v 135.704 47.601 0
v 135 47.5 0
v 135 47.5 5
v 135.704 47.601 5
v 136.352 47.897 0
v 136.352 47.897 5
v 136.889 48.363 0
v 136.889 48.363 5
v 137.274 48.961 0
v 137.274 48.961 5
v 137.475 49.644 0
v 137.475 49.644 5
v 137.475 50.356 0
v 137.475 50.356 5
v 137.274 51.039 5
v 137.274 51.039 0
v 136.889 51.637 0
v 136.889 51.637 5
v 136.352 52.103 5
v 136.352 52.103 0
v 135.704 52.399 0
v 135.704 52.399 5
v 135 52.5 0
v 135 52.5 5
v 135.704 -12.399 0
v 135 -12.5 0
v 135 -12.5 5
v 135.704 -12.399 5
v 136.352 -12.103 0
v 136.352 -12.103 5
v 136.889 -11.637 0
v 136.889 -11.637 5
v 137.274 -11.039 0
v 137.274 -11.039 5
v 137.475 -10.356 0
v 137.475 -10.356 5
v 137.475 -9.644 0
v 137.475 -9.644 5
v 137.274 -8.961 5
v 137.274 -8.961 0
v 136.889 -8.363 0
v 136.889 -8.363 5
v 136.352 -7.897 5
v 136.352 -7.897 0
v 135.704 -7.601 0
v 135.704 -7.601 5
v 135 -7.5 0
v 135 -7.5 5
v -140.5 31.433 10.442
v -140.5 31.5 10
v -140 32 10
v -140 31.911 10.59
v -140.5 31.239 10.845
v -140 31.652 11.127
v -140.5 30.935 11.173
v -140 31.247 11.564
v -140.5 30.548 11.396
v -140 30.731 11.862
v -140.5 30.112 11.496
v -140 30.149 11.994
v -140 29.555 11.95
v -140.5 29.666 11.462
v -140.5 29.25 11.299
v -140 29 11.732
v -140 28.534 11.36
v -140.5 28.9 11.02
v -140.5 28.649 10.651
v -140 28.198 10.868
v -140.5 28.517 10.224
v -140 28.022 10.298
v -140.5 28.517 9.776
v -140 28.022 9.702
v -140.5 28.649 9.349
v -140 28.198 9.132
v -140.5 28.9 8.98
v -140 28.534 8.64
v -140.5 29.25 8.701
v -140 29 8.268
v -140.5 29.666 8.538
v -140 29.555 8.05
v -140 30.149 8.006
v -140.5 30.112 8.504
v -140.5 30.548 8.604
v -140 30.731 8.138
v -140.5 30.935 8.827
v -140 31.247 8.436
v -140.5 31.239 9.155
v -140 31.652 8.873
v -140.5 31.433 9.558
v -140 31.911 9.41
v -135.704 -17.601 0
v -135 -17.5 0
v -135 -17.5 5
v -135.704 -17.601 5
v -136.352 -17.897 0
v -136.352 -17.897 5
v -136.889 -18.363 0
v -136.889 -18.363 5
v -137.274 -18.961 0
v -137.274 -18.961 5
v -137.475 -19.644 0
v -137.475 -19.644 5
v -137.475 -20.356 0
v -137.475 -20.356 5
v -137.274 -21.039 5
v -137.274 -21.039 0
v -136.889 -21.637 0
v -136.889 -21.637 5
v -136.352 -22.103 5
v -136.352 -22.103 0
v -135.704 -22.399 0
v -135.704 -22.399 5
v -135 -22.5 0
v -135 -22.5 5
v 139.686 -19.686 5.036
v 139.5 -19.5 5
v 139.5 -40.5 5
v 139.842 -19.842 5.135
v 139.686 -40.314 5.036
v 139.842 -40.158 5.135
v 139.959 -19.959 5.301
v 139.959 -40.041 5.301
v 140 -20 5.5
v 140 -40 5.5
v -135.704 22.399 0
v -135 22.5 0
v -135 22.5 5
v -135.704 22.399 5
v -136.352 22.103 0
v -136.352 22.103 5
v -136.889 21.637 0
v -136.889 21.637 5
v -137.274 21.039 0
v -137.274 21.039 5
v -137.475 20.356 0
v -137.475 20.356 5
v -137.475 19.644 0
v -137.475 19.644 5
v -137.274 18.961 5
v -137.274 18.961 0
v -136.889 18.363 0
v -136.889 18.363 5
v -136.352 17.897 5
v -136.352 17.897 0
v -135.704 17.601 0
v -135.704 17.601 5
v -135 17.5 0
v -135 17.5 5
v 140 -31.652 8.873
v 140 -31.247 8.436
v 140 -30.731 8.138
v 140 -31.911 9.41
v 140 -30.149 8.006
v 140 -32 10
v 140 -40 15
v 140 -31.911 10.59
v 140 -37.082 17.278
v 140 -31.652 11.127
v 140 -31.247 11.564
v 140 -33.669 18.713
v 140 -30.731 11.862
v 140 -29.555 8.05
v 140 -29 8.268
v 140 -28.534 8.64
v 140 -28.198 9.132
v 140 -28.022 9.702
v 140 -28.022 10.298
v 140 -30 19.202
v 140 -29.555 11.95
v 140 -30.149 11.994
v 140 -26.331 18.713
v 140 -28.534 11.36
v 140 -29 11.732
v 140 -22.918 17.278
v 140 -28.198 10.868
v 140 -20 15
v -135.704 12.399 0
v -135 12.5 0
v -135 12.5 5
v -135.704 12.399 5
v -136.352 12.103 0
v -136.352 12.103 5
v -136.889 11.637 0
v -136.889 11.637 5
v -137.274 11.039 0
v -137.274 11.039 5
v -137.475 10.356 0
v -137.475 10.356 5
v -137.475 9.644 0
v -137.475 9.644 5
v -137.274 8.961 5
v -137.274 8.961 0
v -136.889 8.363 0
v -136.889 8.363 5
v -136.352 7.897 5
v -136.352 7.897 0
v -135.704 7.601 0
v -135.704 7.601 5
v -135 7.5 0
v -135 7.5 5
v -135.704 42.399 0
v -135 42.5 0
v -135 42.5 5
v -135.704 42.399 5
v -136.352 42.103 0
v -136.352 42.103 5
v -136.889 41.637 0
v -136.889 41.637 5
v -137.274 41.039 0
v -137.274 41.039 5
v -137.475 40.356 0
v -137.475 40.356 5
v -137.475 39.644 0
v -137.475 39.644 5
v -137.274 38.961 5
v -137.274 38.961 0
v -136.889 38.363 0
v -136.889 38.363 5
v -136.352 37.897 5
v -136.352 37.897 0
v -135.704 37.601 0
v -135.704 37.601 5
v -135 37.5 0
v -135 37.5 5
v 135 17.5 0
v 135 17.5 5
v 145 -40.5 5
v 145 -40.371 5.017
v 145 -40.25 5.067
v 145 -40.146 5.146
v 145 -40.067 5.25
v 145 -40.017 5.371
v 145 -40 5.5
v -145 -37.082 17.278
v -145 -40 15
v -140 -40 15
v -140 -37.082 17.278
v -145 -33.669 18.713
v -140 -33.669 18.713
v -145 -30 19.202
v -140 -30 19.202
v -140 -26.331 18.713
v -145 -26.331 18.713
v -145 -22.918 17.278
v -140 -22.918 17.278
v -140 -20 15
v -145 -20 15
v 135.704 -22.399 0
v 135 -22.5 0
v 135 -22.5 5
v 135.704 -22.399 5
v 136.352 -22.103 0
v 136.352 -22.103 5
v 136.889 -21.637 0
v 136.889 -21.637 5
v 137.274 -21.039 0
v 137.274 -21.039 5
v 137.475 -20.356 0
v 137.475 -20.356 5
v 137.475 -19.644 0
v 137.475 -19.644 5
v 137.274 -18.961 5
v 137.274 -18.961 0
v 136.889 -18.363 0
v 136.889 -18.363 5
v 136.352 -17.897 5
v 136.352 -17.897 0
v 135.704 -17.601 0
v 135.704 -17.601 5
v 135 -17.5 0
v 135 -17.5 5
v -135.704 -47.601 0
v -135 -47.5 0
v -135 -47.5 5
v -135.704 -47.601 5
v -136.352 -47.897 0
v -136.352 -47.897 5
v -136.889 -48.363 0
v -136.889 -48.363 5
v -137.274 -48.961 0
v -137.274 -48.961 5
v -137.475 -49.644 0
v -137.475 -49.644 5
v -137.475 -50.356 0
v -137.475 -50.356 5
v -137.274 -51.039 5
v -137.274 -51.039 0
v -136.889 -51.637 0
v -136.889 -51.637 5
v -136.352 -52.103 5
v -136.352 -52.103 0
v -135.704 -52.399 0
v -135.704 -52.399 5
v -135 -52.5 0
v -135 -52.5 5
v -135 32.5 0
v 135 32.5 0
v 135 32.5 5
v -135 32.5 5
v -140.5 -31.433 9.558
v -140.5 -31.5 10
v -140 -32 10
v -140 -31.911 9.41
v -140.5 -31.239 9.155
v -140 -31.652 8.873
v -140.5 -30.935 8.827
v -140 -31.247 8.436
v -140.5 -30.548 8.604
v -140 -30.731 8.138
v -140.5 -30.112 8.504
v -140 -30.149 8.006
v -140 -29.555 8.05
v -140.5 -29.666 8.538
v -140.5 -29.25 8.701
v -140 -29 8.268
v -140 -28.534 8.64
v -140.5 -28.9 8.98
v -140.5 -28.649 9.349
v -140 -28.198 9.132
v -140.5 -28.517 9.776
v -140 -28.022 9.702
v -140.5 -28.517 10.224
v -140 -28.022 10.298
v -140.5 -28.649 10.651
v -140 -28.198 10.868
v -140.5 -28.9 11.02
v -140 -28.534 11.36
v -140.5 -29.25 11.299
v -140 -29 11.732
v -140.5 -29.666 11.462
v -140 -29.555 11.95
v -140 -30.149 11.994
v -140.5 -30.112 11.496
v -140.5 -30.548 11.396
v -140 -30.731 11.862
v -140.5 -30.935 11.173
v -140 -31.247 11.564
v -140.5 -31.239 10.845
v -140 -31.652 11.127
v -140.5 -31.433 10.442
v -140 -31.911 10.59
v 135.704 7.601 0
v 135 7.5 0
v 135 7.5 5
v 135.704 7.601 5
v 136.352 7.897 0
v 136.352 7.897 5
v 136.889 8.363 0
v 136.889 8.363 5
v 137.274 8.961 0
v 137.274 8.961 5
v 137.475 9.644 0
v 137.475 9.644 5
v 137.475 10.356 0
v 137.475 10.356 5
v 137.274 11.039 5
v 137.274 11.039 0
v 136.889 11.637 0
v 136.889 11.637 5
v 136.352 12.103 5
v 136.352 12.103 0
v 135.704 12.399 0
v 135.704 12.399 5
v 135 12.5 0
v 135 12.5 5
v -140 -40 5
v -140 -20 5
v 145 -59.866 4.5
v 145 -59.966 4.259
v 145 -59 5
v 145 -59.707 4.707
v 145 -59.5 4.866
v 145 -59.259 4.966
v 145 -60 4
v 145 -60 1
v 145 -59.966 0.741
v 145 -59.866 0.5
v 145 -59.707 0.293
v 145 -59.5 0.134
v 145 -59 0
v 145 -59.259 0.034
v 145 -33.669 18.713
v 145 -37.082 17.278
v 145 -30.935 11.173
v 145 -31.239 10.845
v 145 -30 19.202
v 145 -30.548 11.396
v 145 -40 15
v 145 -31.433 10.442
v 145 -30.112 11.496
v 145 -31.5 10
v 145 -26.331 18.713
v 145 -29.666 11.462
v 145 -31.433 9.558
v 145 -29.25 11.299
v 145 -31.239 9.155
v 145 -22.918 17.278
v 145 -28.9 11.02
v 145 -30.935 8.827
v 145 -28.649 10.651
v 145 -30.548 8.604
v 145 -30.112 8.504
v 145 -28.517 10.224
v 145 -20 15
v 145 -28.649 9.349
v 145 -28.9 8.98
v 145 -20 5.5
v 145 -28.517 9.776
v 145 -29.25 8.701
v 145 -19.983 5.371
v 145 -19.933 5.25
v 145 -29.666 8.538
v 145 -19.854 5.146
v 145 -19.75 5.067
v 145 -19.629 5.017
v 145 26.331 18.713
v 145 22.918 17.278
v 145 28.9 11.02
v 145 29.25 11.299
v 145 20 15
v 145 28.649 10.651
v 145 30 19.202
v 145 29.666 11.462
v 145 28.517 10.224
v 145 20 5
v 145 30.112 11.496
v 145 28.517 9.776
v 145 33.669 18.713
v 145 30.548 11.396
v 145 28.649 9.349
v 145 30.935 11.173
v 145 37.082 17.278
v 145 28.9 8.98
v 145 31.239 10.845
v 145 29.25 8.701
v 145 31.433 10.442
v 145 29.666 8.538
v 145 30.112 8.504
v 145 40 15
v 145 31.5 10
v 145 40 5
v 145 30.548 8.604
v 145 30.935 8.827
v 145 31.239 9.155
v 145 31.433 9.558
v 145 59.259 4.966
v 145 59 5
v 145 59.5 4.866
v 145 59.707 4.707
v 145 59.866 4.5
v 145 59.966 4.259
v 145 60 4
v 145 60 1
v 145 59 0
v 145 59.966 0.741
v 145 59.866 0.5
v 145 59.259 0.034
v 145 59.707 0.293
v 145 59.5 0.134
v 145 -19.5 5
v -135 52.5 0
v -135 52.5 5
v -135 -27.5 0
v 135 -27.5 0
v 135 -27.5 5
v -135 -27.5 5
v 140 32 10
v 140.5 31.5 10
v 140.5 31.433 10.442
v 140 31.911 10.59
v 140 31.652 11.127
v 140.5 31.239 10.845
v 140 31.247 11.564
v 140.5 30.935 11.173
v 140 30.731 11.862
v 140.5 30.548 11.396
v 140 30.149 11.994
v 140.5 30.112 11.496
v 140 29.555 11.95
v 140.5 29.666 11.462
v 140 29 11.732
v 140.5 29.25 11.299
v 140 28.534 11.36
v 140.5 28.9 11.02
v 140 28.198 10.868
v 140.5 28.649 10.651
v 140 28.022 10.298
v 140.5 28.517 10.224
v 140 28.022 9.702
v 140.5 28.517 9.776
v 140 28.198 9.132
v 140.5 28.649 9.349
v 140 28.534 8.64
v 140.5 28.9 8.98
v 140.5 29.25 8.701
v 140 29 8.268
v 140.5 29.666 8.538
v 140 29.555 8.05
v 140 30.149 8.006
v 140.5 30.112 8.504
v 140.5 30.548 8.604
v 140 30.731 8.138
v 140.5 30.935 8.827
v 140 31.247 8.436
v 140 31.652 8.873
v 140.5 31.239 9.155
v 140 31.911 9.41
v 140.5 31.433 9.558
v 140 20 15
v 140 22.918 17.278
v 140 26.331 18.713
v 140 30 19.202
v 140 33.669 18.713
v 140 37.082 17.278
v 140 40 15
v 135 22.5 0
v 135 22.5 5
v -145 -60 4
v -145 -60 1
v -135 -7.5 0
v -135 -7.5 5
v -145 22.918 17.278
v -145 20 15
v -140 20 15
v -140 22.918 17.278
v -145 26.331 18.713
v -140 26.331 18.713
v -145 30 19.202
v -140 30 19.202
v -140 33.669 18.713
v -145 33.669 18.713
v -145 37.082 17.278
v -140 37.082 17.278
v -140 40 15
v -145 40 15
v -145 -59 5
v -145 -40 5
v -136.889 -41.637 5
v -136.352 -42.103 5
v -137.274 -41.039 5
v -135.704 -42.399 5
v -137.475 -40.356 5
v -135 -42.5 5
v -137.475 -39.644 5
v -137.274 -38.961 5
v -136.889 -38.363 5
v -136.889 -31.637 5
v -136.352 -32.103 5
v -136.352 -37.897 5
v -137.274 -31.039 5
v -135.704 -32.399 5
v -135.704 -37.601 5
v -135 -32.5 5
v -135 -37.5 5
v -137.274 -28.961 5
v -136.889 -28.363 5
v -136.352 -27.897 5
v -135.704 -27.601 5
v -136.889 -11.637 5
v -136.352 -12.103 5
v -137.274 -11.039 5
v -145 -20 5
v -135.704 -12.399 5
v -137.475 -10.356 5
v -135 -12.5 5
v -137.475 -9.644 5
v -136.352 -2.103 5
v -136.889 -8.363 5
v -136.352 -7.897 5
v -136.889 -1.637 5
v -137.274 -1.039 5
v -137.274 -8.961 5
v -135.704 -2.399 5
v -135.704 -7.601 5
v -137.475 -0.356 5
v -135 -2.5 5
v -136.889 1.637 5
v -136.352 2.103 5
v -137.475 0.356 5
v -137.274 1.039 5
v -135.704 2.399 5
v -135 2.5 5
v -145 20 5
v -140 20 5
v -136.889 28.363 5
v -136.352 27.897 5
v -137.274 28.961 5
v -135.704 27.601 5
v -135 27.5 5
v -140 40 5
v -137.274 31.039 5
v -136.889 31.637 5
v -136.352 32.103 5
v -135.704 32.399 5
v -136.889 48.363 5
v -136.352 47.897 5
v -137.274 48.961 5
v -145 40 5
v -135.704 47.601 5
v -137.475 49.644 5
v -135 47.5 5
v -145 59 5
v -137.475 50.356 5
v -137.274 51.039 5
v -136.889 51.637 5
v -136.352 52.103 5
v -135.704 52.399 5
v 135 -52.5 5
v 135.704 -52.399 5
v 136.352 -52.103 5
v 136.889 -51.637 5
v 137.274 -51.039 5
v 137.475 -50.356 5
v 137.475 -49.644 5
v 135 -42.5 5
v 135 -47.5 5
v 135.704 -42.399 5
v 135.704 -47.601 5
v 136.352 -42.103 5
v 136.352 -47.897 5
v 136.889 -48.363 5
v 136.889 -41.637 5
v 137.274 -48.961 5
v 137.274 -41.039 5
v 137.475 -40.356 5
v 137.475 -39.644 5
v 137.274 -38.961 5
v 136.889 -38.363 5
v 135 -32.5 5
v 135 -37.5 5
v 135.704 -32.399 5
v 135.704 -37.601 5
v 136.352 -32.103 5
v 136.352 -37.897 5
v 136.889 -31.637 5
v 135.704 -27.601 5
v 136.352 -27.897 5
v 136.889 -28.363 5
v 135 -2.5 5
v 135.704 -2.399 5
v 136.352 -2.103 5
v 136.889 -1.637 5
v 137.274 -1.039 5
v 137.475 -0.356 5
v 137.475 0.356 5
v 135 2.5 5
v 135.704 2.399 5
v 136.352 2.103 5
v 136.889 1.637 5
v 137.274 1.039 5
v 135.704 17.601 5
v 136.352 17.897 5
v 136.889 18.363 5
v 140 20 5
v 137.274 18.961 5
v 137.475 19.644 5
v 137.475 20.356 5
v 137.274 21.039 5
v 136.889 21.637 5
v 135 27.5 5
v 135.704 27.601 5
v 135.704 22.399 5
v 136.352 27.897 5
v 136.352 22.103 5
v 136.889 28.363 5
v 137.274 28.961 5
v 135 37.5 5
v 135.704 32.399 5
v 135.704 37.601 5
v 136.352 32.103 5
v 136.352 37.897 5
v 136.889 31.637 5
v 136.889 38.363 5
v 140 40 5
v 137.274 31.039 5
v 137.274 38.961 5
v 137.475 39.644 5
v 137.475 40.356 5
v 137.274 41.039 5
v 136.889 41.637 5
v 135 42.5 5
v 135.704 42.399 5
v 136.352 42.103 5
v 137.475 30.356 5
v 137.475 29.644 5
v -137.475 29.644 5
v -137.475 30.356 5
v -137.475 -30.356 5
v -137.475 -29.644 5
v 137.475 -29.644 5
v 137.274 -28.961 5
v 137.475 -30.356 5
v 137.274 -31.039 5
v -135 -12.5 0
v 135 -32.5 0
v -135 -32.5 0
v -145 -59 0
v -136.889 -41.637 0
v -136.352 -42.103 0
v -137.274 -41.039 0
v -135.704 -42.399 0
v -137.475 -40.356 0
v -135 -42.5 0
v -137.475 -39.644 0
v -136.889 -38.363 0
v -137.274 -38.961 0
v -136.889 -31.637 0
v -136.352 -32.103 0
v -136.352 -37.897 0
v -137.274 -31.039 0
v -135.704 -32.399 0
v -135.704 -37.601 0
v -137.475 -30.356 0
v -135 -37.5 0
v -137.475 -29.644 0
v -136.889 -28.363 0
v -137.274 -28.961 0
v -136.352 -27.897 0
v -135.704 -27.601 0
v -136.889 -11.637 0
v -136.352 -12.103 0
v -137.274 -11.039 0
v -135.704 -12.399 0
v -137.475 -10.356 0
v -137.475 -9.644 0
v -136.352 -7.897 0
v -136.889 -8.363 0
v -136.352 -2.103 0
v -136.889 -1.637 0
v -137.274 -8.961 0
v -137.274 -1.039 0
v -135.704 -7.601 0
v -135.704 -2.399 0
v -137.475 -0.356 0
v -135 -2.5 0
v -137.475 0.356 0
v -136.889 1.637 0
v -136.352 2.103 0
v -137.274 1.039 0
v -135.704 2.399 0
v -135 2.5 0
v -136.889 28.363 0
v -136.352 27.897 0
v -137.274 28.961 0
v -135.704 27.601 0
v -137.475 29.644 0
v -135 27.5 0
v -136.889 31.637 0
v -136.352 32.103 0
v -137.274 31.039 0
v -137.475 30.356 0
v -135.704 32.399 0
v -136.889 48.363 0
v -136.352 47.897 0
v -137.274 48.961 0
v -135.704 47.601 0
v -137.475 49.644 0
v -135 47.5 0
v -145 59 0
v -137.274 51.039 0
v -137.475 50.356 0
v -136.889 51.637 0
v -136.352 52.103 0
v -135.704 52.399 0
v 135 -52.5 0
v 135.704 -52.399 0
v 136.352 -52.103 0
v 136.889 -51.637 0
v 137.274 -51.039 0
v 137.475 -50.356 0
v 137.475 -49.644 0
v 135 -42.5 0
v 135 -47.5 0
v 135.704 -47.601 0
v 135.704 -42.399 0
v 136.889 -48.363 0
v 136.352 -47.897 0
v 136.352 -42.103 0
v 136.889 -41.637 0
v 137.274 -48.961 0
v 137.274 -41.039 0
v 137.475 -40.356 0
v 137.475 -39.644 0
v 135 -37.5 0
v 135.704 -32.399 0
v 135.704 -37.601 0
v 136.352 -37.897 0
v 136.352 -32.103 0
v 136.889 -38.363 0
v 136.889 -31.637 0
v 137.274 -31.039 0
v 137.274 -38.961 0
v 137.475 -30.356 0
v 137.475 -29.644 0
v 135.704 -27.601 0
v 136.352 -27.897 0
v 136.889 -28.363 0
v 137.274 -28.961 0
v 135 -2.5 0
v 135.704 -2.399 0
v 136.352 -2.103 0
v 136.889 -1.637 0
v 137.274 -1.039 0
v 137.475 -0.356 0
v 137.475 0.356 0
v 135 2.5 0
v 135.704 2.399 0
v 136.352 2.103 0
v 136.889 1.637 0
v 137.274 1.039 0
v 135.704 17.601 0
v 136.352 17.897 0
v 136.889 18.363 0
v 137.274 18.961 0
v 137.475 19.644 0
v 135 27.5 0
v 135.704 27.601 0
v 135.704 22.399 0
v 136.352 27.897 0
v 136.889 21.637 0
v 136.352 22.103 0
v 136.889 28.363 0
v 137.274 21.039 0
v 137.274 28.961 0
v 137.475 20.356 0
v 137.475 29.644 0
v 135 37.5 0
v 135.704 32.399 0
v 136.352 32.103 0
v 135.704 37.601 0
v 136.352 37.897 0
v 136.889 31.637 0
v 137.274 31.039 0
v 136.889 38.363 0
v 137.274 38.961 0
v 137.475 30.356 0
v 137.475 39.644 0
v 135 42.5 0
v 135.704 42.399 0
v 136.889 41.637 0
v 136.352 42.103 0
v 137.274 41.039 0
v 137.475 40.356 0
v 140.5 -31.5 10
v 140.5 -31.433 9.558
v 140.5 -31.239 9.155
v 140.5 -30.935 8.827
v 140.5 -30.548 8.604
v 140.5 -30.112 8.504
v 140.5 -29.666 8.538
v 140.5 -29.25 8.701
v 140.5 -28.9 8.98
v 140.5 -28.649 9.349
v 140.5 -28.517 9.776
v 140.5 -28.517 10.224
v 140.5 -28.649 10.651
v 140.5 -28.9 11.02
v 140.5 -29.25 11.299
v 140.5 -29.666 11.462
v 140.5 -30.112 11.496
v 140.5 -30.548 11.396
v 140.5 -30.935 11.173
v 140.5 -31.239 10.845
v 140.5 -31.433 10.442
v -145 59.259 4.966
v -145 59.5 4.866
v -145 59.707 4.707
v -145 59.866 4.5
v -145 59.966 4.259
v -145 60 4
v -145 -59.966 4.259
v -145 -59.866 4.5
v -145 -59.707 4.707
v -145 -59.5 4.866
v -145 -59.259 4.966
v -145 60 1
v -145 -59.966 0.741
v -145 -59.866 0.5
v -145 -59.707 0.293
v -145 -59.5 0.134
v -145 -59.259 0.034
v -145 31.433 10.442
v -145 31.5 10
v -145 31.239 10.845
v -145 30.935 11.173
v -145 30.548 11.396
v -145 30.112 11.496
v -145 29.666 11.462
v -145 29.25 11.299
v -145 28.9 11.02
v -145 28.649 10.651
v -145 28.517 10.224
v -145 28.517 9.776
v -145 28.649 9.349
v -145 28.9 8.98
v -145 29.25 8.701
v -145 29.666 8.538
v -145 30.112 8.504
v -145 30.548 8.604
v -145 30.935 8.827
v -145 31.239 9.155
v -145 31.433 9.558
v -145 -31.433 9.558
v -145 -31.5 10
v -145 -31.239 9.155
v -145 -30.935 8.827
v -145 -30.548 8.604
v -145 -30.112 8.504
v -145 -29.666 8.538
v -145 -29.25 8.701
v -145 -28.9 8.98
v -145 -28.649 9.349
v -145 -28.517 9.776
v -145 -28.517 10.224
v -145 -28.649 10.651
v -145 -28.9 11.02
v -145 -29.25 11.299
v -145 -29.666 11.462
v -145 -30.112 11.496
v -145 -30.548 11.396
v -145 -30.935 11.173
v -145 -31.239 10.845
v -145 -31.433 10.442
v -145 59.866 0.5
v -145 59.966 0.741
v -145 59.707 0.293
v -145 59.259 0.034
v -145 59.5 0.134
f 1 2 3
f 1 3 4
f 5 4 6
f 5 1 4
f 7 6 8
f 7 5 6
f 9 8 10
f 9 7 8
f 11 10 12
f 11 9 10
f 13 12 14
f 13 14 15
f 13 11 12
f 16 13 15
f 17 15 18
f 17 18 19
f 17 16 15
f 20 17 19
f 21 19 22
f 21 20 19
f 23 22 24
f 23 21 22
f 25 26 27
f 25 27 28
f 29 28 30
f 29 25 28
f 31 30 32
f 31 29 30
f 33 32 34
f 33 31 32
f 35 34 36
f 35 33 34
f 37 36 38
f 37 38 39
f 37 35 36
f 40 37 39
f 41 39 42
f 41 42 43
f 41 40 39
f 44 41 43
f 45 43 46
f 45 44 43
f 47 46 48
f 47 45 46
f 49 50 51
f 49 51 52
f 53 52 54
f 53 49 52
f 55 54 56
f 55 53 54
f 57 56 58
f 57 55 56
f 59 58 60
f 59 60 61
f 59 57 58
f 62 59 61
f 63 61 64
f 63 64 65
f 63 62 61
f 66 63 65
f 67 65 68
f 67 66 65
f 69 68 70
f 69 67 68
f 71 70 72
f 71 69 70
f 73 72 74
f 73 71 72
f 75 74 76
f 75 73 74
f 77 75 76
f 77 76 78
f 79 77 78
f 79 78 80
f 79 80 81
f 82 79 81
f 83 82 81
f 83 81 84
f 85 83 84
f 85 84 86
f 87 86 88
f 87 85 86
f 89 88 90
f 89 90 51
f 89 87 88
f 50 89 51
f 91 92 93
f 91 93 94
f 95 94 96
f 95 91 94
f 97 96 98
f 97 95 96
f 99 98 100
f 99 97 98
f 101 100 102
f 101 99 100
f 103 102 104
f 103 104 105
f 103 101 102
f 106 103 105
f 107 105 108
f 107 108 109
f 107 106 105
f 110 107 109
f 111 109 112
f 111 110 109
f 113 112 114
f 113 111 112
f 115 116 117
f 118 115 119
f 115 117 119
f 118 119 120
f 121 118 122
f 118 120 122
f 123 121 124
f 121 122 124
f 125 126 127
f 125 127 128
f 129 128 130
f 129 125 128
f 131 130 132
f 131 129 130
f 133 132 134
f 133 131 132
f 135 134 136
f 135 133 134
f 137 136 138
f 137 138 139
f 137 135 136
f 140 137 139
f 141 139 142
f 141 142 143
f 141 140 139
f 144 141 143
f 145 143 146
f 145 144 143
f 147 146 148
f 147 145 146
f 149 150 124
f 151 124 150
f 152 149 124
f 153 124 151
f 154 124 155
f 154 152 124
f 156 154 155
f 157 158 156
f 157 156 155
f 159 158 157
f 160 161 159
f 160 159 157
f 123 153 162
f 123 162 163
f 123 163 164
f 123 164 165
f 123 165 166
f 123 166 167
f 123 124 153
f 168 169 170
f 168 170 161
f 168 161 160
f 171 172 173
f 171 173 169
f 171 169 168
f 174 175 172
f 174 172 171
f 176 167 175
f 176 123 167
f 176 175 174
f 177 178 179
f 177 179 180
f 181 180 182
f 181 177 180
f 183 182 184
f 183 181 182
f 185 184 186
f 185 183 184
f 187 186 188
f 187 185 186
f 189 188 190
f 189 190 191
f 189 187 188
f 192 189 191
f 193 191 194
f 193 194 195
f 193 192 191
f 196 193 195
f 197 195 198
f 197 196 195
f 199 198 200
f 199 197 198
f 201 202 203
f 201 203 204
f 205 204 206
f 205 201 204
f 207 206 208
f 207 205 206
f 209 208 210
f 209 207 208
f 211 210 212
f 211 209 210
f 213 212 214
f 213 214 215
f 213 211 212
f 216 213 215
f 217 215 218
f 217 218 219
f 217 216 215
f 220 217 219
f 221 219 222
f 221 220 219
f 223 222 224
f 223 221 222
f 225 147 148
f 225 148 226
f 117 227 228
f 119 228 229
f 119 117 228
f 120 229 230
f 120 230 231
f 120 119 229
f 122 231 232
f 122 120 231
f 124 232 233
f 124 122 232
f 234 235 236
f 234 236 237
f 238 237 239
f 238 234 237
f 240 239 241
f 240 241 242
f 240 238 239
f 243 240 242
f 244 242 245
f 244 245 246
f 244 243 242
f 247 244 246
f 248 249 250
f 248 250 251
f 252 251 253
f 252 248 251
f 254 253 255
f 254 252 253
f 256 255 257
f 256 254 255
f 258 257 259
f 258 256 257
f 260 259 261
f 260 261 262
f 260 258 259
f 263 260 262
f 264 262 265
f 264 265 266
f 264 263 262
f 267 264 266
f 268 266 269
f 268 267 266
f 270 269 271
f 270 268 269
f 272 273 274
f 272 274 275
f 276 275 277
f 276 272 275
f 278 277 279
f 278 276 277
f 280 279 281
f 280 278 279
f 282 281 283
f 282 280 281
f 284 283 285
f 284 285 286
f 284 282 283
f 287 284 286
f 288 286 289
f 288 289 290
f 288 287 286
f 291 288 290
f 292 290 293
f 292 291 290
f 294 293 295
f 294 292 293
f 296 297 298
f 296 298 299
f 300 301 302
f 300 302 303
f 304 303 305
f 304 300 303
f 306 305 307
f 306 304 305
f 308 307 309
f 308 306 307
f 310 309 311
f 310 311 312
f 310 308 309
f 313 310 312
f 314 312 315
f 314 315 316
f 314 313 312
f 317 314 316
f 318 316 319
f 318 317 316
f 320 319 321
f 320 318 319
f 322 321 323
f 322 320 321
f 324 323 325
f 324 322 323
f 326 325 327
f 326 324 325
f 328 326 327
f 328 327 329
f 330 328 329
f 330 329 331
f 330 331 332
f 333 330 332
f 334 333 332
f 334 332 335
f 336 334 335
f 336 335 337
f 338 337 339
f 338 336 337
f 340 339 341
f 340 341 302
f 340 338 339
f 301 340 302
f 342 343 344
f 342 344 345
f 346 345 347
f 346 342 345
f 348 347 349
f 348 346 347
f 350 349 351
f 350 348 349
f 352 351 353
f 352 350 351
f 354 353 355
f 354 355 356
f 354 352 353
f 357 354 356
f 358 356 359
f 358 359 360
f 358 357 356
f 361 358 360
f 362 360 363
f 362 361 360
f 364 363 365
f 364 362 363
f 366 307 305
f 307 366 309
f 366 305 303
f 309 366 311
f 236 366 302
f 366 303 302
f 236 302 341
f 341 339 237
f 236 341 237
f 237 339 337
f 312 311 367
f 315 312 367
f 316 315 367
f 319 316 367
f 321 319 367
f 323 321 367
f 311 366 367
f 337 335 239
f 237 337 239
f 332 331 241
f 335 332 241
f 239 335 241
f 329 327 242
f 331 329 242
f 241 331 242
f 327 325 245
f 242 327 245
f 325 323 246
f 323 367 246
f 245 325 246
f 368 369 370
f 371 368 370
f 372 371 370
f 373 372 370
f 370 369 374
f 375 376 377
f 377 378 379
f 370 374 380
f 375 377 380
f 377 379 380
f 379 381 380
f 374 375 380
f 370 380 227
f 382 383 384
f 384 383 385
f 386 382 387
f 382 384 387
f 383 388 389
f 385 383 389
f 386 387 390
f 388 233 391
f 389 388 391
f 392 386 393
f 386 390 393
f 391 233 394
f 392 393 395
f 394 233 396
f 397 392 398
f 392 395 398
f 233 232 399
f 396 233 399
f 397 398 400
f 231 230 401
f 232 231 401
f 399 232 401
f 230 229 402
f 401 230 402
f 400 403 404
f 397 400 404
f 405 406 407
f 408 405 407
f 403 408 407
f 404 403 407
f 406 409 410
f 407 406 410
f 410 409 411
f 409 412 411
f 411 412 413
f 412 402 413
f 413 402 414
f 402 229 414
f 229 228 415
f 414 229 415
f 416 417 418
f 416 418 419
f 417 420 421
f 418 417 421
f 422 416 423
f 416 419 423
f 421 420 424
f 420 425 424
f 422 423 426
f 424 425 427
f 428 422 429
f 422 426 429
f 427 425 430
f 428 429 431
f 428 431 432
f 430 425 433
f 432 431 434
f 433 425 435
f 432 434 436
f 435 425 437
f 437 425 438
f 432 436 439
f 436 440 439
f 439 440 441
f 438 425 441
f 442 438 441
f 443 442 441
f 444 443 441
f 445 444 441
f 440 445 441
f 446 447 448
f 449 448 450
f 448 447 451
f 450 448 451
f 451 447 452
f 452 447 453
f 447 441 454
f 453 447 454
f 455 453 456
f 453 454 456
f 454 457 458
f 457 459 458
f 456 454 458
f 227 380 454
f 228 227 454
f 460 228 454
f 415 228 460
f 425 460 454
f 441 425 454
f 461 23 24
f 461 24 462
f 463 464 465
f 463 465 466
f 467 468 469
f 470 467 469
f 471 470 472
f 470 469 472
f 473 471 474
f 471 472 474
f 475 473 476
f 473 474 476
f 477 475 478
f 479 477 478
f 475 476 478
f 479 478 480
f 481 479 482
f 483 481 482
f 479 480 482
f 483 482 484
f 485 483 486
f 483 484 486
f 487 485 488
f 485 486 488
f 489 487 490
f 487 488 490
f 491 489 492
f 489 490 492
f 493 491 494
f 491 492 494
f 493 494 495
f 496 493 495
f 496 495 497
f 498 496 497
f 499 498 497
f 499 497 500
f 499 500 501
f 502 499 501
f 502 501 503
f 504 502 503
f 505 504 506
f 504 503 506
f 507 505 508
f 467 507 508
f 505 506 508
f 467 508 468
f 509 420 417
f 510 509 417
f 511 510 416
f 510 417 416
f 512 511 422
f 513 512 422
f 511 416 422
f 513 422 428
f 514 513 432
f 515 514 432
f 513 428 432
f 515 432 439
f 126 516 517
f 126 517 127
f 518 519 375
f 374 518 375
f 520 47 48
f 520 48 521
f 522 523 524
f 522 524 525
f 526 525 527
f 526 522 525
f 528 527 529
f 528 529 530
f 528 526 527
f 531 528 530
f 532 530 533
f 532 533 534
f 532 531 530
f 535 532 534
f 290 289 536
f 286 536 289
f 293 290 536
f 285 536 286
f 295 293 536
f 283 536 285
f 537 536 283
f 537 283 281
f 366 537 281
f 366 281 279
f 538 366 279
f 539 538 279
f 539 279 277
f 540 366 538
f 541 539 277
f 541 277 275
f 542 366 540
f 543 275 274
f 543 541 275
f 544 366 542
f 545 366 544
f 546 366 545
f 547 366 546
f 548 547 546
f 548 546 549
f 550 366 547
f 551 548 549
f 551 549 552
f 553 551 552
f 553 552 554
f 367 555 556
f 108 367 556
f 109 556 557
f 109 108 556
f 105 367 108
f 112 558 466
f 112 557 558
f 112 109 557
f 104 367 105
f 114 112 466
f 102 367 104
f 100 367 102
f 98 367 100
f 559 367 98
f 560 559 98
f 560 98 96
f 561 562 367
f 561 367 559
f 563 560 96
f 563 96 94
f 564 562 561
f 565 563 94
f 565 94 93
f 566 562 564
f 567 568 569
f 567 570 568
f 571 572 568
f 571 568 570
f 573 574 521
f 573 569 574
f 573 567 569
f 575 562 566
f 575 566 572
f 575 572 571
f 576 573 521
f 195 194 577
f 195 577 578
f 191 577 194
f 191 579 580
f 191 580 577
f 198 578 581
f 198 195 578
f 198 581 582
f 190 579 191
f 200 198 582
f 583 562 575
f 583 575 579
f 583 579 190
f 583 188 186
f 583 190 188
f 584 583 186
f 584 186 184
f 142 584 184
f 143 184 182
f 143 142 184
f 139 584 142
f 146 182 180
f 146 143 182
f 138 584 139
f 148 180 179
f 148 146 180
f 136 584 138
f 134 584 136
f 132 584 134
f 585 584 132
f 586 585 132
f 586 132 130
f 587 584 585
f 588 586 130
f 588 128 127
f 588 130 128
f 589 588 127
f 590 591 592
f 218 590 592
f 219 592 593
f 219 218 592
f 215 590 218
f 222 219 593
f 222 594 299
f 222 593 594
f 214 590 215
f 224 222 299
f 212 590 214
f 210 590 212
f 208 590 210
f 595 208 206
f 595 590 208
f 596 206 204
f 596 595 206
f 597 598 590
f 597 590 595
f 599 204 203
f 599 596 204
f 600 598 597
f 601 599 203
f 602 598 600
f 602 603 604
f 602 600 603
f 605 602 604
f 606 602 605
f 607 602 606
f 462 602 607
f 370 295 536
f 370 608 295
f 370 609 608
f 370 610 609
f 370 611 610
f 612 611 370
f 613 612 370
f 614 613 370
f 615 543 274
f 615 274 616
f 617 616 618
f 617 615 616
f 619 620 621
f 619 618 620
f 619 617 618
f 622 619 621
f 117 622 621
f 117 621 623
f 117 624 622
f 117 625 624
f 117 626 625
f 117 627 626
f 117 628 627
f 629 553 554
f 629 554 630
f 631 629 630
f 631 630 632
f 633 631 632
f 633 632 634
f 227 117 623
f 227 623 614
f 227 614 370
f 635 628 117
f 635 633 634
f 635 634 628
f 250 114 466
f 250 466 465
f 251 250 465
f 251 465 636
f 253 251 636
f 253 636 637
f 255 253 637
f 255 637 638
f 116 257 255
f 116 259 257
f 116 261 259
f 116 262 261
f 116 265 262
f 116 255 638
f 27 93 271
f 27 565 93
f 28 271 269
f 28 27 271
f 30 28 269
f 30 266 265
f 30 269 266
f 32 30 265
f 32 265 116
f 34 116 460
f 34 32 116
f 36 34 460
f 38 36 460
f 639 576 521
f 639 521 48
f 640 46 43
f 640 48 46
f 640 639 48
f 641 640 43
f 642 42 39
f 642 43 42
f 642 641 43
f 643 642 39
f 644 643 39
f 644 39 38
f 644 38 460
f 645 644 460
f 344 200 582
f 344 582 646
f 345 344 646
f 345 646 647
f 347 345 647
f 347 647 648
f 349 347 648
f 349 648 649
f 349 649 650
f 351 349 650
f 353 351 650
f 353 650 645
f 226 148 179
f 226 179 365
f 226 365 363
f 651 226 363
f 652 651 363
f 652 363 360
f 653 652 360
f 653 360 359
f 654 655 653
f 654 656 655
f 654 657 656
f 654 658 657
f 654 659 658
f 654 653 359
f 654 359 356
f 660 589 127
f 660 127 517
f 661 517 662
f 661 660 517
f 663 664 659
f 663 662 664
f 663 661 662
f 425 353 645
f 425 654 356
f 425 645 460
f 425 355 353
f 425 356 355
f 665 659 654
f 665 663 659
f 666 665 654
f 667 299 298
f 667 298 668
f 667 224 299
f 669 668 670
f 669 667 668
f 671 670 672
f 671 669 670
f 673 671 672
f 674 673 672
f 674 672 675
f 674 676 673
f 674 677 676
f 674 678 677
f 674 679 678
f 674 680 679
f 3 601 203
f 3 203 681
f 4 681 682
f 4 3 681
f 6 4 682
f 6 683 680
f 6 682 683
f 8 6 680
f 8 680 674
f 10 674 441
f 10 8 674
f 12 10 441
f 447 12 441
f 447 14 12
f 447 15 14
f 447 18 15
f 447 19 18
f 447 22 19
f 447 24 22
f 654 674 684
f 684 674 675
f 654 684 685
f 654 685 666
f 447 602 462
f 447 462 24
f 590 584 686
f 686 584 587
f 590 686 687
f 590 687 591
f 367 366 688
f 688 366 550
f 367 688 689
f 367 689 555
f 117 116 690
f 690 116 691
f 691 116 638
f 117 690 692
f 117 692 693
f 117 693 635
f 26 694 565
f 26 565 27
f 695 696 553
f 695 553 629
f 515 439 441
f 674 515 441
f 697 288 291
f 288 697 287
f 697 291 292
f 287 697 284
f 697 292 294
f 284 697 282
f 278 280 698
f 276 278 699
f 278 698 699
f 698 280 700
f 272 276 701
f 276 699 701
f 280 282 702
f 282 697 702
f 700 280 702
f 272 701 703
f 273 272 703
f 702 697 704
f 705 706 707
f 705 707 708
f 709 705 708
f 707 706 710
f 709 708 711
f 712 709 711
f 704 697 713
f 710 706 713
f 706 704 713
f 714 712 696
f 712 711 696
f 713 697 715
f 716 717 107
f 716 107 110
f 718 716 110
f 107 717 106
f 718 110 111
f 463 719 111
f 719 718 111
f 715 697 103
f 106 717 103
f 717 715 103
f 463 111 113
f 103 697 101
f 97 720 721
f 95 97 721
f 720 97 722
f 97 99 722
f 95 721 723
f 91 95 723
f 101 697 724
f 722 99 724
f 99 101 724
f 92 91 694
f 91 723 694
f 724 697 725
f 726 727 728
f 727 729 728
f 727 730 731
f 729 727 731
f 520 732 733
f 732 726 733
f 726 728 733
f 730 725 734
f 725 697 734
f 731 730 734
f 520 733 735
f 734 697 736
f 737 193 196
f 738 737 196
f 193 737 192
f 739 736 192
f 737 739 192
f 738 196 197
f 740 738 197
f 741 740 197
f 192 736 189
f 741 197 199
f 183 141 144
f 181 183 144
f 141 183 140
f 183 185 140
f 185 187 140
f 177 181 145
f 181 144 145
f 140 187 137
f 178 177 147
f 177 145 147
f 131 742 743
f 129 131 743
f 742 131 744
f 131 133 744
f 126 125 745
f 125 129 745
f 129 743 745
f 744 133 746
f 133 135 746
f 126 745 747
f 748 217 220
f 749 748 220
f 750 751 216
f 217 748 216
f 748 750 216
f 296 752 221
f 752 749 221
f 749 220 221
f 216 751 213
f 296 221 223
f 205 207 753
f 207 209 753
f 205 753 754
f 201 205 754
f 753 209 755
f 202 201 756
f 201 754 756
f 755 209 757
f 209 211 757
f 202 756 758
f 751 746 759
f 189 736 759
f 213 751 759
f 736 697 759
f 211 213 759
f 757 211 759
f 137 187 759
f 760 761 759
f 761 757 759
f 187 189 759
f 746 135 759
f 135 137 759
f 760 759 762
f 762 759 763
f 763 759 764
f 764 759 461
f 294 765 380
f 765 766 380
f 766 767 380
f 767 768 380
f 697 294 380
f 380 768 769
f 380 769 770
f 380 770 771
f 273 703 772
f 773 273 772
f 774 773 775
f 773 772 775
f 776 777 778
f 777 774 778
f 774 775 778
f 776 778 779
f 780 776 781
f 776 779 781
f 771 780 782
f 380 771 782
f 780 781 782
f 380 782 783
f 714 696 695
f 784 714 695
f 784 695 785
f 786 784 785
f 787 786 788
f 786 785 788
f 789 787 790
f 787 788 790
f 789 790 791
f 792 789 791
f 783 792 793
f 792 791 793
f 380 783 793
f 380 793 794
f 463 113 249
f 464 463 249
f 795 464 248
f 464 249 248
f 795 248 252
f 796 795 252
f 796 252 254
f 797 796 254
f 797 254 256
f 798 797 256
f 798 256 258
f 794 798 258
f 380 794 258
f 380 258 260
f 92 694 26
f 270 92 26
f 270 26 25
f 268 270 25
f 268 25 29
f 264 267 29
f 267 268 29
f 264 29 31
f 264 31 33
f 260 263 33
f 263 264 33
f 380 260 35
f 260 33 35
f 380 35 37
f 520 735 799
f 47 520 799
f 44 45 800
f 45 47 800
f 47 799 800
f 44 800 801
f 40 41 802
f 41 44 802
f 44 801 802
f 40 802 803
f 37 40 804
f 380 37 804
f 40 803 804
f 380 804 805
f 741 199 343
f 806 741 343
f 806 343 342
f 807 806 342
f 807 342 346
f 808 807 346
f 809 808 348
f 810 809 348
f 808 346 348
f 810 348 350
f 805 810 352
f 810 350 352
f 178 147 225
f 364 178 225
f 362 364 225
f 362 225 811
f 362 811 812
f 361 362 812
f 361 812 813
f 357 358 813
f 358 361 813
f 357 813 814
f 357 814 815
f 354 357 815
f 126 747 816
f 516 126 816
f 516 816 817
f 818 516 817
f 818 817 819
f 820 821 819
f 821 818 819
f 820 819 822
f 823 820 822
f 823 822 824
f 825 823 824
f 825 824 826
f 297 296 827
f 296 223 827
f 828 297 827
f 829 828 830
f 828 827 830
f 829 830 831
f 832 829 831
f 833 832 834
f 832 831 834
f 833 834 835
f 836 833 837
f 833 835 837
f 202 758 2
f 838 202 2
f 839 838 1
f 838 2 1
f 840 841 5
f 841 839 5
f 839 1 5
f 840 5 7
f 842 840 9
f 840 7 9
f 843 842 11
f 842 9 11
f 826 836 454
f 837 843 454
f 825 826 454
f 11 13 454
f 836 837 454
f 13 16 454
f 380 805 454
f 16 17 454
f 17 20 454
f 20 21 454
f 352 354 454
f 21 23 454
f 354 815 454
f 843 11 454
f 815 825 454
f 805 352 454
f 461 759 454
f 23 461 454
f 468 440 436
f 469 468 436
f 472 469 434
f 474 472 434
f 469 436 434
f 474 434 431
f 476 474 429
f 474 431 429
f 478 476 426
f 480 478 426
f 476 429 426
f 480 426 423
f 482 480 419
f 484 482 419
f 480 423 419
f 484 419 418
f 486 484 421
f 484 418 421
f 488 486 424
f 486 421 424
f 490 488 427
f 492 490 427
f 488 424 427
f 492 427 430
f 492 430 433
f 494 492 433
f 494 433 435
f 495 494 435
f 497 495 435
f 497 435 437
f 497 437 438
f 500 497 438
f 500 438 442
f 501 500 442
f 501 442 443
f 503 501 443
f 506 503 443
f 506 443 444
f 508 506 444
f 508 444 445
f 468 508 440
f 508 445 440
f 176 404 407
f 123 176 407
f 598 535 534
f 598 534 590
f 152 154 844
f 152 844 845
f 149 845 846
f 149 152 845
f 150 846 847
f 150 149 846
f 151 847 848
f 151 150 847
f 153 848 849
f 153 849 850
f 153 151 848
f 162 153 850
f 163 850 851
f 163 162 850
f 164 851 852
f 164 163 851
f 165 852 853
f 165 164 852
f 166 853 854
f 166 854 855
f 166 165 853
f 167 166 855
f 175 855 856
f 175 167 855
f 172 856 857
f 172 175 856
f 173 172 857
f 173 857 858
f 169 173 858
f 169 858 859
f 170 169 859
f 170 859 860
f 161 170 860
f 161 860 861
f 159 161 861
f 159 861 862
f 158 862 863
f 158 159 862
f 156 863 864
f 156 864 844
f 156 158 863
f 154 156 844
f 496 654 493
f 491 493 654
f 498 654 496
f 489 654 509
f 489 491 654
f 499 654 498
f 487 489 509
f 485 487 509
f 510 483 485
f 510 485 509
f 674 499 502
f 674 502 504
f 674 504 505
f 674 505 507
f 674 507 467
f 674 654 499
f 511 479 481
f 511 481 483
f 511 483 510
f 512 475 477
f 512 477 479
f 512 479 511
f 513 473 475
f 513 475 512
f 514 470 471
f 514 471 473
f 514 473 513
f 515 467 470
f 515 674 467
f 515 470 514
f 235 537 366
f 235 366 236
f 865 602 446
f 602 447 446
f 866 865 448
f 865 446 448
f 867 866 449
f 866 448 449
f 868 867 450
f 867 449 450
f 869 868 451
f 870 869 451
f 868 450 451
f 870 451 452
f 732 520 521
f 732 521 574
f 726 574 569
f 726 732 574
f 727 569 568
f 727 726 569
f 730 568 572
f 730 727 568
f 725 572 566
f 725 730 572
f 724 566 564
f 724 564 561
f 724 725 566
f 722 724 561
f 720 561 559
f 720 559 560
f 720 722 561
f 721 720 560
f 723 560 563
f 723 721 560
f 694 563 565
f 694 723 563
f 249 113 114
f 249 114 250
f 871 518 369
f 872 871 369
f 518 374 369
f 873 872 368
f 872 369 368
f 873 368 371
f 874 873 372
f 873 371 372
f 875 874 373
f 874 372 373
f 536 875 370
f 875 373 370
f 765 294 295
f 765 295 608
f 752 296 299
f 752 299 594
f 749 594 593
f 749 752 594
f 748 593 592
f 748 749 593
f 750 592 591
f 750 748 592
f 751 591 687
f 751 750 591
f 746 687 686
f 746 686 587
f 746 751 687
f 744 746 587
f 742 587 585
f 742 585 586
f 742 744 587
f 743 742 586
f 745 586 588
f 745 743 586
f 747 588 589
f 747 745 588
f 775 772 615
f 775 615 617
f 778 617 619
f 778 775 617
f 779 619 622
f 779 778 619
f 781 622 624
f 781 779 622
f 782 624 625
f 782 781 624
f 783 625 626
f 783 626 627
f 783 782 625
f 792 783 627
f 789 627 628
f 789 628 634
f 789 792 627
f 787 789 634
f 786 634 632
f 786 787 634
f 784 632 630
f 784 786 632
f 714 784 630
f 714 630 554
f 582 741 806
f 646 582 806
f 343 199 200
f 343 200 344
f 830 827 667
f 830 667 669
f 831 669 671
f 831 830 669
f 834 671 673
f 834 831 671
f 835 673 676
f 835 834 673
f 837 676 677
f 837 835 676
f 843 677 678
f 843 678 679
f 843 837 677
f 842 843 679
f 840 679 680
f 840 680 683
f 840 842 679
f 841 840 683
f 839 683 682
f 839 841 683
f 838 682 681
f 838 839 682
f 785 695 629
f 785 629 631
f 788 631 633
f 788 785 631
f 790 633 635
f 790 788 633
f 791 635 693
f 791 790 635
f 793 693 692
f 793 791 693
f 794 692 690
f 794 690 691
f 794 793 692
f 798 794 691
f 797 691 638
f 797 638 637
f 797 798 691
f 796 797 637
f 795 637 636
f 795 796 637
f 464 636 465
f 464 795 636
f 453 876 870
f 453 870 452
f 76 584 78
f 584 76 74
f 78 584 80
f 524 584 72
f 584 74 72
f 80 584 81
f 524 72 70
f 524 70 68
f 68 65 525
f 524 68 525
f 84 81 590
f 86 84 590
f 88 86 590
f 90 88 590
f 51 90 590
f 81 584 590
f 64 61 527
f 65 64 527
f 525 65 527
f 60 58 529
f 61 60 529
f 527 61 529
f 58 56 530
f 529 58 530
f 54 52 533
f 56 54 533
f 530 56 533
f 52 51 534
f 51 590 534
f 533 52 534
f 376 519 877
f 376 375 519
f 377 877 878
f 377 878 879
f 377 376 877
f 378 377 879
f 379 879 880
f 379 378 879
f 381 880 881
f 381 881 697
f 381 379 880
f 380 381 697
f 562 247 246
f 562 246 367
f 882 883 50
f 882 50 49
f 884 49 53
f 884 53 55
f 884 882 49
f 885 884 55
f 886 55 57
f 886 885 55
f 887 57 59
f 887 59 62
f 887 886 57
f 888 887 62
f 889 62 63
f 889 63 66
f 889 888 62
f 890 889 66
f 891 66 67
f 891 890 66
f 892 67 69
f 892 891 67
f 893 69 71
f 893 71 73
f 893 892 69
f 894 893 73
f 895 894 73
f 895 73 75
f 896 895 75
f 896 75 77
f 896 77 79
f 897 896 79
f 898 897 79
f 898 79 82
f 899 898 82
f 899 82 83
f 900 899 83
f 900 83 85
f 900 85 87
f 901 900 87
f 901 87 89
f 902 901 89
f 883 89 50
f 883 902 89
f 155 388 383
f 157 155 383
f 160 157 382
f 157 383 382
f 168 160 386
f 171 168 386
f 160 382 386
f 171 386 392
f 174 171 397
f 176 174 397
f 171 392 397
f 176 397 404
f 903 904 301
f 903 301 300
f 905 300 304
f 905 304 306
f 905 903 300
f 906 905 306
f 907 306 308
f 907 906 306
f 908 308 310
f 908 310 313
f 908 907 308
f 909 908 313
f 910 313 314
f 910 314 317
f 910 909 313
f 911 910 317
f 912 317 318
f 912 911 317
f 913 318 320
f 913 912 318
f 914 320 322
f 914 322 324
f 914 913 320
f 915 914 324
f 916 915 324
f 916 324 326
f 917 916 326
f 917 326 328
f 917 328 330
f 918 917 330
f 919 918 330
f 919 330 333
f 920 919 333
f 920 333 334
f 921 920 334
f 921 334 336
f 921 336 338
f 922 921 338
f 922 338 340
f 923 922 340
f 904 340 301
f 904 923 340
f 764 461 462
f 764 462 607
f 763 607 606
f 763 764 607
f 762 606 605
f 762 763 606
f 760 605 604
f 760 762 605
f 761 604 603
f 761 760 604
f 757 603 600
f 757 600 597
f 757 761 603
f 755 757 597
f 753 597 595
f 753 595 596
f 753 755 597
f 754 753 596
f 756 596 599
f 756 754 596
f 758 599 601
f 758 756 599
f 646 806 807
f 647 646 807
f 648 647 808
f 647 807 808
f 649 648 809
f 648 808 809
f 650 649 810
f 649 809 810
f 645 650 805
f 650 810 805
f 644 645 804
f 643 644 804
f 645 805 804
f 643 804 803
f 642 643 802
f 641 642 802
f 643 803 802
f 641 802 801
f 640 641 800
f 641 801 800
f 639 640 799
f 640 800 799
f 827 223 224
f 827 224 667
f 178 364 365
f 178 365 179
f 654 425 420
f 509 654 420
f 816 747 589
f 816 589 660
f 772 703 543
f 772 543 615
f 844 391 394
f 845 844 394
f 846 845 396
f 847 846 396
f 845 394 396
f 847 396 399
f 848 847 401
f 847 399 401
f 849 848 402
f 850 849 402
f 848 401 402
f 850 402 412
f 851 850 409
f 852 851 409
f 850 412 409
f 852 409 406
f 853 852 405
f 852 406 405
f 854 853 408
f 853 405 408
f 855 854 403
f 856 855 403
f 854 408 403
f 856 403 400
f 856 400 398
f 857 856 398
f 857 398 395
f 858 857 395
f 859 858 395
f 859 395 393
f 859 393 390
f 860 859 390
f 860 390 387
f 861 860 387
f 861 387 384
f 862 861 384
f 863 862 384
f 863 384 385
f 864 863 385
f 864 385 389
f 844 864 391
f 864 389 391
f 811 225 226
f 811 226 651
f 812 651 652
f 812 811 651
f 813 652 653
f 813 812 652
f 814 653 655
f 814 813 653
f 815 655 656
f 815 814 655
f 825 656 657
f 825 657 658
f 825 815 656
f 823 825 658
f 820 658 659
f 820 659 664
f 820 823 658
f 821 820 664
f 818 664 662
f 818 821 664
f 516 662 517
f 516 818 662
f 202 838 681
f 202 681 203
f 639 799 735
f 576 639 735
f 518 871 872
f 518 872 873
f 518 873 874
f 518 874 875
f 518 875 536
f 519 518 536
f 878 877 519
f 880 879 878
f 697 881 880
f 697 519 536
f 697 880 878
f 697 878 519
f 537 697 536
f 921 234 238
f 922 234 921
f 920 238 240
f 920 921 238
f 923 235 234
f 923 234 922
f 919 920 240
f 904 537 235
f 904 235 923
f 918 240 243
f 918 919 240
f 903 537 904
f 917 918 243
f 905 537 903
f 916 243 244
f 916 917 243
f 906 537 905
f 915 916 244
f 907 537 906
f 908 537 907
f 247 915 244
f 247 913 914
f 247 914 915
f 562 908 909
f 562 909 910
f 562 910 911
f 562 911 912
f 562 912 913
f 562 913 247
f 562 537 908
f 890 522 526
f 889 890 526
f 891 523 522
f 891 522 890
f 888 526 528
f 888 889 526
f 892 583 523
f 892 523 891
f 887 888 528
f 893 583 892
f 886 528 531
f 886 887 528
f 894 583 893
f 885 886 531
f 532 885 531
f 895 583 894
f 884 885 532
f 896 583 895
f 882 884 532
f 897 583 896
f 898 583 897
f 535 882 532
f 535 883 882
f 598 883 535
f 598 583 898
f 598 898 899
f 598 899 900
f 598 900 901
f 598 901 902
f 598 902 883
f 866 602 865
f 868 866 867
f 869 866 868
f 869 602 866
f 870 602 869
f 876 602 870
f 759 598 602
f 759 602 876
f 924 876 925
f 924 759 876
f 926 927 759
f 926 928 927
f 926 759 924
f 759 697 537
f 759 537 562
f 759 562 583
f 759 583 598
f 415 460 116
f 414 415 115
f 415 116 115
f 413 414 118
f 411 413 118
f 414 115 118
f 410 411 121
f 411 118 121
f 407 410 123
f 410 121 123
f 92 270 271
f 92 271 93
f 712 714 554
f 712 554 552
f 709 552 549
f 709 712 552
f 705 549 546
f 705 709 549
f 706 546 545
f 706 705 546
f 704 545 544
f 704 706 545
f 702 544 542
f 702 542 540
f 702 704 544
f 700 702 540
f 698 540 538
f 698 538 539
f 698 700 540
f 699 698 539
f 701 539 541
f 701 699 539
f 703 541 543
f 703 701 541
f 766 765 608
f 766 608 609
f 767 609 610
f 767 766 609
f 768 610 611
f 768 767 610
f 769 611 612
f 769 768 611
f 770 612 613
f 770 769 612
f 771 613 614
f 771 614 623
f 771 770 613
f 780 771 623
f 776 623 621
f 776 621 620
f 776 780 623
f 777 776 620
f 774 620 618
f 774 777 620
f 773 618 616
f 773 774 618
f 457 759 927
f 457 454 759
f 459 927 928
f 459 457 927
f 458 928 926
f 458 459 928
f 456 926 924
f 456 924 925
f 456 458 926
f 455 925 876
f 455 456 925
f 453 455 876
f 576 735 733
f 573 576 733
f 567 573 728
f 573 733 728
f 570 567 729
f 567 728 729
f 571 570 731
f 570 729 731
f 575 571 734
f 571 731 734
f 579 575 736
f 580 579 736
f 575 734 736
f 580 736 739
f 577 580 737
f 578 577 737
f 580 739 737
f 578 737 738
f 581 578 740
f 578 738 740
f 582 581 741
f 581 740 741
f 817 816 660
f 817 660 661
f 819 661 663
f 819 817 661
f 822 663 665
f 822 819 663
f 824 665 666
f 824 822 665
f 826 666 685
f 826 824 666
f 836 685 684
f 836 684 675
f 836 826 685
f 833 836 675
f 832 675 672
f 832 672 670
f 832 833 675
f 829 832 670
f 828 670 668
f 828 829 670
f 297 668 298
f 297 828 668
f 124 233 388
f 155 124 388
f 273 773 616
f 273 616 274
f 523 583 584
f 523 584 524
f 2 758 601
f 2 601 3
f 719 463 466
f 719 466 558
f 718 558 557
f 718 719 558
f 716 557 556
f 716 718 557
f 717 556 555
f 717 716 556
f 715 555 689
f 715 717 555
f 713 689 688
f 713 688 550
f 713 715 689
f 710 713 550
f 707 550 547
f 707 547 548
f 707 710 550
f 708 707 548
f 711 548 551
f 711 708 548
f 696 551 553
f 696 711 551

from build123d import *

# Parameters (mm, degrees)
ESQUISSE1_W        = 290
ESQUISSE1_H        = 120
BOSS_EXTRU_1_DEPTH = 5
CONG_1_R           = 1
CONG_2_R           = 1
ESQUISSE2_R        = 1.5
BOSS_EXTRU_2_DEPTH = 5
CONG_3_R           = 0.5
CHANFREIN1_SIZE    = 0.5


with BuildPart() as part:
    # Esquisse1 → Boss.-Extru.1 (new body)
    with BuildSketch(Plane.XY):
        Rectangle(ESQUISSE1_W, ESQUISSE1_H)
        with BuildLine():
            Line((-135, 2.5), (135, 2.5))
            ThreePointArc((135, 2.5), (137.5, 0), (135, -2.5))
            Line((135, -2.5), (-135, -2.5))
            ThreePointArc((-135, -2.5), (-137.5, 0), (-135, 2.5))
        make_face(mode=Mode.SUBTRACT)
        with BuildLine():
            Line((-135, 7.5), (135, 7.5))
            ThreePointArc((135, 7.5), (137.5, 10), (135, 12.5))
            Line((135, 12.5), (-135, 12.5))
            ThreePointArc((-135, 12.5), (-137.5, 10), (-135, 7.5))
        make_face(mode=Mode.SUBTRACT)
        with BuildLine():
            Line((-135, 17.5), (135, 17.5))
            ThreePointArc((135, 17.5), (137.5, 20), (135, 22.5))
            Line((135, 22.5), (-135, 22.5))
            ThreePointArc((-135, 22.5), (-137.5, 20), (-135, 17.5))
        make_face(mode=Mode.SUBTRACT)
        with BuildLine():
            Line((-135, 27.5), (135, 27.5))
            ThreePointArc((135, 27.5), (137.5, 30), (135, 32.5))
            Line((135, 32.5), (-135, 32.5))
            ThreePointArc((-135, 32.5), (-137.5, 30), (-135, 27.5))
        make_face(mode=Mode.SUBTRACT)
        with BuildLine():
            Line((-135, 37.5), (135, 37.5))
            ThreePointArc((135, 37.5), (137.5, 40), (135, 42.5))
            Line((135, 42.5), (-135, 42.5))
            ThreePointArc((-135, 42.5), (-137.5, 40), (-135, 37.5))
        make_face(mode=Mode.SUBTRACT)
        with BuildLine():
            Line((-135, 47.5), (135, 47.5))
            ThreePointArc((135, 47.5), (137.5, 50), (135, 52.5))
            Line((135, 52.5), (-135, 52.5))
            ThreePointArc((-135, 52.5), (-137.5, 50), (-135, 47.5))
        make_face(mode=Mode.SUBTRACT)
        with BuildLine():
            Line((-135, -12.5), (135, -12.5))
            ThreePointArc((135, -12.5), (137.5, -10), (135, -7.5))
            Line((135, -7.5), (-135, -7.5))
            ThreePointArc((-135, -7.5), (-137.5, -10), (-135, -12.5))
        make_face(mode=Mode.SUBTRACT)
        with BuildLine():
            Line((-135, -22.5), (135, -22.5))
            ThreePointArc((135, -22.5), (137.5, -20), (135, -17.5))
            Line((135, -17.5), (-135, -17.5))
            ThreePointArc((-135, -17.5), (-137.5, -20), (-135, -22.5))
        make_face(mode=Mode.SUBTRACT)
        with BuildLine():
            Line((-135, -32.5), (135, -32.5))
            ThreePointArc((135, -32.5), (137.5, -30), (135, -27.5))
            Line((135, -27.5), (-135, -27.5))
            ThreePointArc((-135, -27.5), (-137.5, -30), (-135, -32.5))
        make_face(mode=Mode.SUBTRACT)
        with BuildLine():
            Line((-135, -42.5), (135, -42.5))
            ThreePointArc((135, -42.5), (137.5, -40), (135, -37.5))
            Line((135, -37.5), (-135, -37.5))
            ThreePointArc((-135, -37.5), (-137.5, -40), (-135, -42.5))
        make_face(mode=Mode.SUBTRACT)
        with BuildLine():
            Line((-135, -52.5), (135, -52.5))
            ThreePointArc((135, -52.5), (137.5, -50), (135, -47.5))
            Line((135, -47.5), (-135, -47.5))
            ThreePointArc((-135, -47.5), (-137.5, -50), (-135, -52.5))
        make_face(mode=Mode.SUBTRACT)
    extrude(amount=BOSS_EXTRU_1_DEPTH)

    # Congé1
    cong_1_edges = [part.edges().sort_by_distance(p)[0] for p in [
        (0, -60, 5),
        (0, -60, 0),
    ]]
    fillet(cong_1_edges, radius=CONG_1_R)

    # Congé2
    cong_2_edges = [part.edges().sort_by_distance(p)[0] for p in [
        (0, 60, 0),
        (0, 60, 5),
    ]]
    fillet(cong_2_edges, radius=CONG_2_R)

    # Esquisse2 → Boss.-Extru.2 (add)
    # profile 1 of 2: a face of its own
    with BuildSketch(Plane(origin=(145, 0, 0), x_dir=(0, 0, -1), z_dir=(1, 0, 0))):
        with BuildLine():
            Line((-5, 20), (-15, 20))
            ThreePointArc((-15, 20), (-19.202041029, 30), (-15, 40))
            Line((-15, 40), (-5, 40))
            Line((-5, 40), (-5, 20))
        make_face()
        with Locations(Location((-10, 30, 0), (0, 0, 90))):
            Circle(ESQUISSE2_R, mode=Mode.SUBTRACT)
    # profile 2 of 2: a face of its own
    with BuildSketch(Plane(origin=(145, 0, 0), x_dir=(0, 0, -1), z_dir=(1, 0, 0))):
        with BuildLine():
            Line((-5, -20), (-5, -40))
            Line((-5, -40), (-15, -40))
            ThreePointArc((-15, -40), (-19.202041029, -30), (-15, -20))
            Line((-15, -20), (-5, -20))
        make_face()
        with Locations(Location((-10, -30, 0), (0, 0, 270))):
            Circle(ESQUISSE2_R, mode=Mode.SUBTRACT)
    boss_extru_2 = extrude(amount=-BOSS_EXTRU_2_DEPTH)

    # Symétrie1: Boss.-Extru.2 across plane
    add(boss_extru_2.mirror(Plane(origin=(0, 0, 0), x_dir=(0, 0, 1), z_dir=(1, 0, 0))))

    # Congé3
    cong_3_edges = [part.edges().sort_by_distance(p)[0] for p in [
        (140, -30, 5),
        (142.5, -20, 5),
        (142.5, -40, 5),
    ]]
    fillet(cong_3_edges, radius=CONG_3_R)

    # Chanfrein1
    chanfrein1_edges = [part.edges().sort_by_distance(p)[0] for p in [
        (140, 28.5, 10),
        (140, -28.5, 10),
        (-140, 28.5, 10),
        (-140, -28.5, 10),
    ]]
    chamfer(chanfrein1_edges, length=CHANFREIN1_SIZE)


solid = part.part
